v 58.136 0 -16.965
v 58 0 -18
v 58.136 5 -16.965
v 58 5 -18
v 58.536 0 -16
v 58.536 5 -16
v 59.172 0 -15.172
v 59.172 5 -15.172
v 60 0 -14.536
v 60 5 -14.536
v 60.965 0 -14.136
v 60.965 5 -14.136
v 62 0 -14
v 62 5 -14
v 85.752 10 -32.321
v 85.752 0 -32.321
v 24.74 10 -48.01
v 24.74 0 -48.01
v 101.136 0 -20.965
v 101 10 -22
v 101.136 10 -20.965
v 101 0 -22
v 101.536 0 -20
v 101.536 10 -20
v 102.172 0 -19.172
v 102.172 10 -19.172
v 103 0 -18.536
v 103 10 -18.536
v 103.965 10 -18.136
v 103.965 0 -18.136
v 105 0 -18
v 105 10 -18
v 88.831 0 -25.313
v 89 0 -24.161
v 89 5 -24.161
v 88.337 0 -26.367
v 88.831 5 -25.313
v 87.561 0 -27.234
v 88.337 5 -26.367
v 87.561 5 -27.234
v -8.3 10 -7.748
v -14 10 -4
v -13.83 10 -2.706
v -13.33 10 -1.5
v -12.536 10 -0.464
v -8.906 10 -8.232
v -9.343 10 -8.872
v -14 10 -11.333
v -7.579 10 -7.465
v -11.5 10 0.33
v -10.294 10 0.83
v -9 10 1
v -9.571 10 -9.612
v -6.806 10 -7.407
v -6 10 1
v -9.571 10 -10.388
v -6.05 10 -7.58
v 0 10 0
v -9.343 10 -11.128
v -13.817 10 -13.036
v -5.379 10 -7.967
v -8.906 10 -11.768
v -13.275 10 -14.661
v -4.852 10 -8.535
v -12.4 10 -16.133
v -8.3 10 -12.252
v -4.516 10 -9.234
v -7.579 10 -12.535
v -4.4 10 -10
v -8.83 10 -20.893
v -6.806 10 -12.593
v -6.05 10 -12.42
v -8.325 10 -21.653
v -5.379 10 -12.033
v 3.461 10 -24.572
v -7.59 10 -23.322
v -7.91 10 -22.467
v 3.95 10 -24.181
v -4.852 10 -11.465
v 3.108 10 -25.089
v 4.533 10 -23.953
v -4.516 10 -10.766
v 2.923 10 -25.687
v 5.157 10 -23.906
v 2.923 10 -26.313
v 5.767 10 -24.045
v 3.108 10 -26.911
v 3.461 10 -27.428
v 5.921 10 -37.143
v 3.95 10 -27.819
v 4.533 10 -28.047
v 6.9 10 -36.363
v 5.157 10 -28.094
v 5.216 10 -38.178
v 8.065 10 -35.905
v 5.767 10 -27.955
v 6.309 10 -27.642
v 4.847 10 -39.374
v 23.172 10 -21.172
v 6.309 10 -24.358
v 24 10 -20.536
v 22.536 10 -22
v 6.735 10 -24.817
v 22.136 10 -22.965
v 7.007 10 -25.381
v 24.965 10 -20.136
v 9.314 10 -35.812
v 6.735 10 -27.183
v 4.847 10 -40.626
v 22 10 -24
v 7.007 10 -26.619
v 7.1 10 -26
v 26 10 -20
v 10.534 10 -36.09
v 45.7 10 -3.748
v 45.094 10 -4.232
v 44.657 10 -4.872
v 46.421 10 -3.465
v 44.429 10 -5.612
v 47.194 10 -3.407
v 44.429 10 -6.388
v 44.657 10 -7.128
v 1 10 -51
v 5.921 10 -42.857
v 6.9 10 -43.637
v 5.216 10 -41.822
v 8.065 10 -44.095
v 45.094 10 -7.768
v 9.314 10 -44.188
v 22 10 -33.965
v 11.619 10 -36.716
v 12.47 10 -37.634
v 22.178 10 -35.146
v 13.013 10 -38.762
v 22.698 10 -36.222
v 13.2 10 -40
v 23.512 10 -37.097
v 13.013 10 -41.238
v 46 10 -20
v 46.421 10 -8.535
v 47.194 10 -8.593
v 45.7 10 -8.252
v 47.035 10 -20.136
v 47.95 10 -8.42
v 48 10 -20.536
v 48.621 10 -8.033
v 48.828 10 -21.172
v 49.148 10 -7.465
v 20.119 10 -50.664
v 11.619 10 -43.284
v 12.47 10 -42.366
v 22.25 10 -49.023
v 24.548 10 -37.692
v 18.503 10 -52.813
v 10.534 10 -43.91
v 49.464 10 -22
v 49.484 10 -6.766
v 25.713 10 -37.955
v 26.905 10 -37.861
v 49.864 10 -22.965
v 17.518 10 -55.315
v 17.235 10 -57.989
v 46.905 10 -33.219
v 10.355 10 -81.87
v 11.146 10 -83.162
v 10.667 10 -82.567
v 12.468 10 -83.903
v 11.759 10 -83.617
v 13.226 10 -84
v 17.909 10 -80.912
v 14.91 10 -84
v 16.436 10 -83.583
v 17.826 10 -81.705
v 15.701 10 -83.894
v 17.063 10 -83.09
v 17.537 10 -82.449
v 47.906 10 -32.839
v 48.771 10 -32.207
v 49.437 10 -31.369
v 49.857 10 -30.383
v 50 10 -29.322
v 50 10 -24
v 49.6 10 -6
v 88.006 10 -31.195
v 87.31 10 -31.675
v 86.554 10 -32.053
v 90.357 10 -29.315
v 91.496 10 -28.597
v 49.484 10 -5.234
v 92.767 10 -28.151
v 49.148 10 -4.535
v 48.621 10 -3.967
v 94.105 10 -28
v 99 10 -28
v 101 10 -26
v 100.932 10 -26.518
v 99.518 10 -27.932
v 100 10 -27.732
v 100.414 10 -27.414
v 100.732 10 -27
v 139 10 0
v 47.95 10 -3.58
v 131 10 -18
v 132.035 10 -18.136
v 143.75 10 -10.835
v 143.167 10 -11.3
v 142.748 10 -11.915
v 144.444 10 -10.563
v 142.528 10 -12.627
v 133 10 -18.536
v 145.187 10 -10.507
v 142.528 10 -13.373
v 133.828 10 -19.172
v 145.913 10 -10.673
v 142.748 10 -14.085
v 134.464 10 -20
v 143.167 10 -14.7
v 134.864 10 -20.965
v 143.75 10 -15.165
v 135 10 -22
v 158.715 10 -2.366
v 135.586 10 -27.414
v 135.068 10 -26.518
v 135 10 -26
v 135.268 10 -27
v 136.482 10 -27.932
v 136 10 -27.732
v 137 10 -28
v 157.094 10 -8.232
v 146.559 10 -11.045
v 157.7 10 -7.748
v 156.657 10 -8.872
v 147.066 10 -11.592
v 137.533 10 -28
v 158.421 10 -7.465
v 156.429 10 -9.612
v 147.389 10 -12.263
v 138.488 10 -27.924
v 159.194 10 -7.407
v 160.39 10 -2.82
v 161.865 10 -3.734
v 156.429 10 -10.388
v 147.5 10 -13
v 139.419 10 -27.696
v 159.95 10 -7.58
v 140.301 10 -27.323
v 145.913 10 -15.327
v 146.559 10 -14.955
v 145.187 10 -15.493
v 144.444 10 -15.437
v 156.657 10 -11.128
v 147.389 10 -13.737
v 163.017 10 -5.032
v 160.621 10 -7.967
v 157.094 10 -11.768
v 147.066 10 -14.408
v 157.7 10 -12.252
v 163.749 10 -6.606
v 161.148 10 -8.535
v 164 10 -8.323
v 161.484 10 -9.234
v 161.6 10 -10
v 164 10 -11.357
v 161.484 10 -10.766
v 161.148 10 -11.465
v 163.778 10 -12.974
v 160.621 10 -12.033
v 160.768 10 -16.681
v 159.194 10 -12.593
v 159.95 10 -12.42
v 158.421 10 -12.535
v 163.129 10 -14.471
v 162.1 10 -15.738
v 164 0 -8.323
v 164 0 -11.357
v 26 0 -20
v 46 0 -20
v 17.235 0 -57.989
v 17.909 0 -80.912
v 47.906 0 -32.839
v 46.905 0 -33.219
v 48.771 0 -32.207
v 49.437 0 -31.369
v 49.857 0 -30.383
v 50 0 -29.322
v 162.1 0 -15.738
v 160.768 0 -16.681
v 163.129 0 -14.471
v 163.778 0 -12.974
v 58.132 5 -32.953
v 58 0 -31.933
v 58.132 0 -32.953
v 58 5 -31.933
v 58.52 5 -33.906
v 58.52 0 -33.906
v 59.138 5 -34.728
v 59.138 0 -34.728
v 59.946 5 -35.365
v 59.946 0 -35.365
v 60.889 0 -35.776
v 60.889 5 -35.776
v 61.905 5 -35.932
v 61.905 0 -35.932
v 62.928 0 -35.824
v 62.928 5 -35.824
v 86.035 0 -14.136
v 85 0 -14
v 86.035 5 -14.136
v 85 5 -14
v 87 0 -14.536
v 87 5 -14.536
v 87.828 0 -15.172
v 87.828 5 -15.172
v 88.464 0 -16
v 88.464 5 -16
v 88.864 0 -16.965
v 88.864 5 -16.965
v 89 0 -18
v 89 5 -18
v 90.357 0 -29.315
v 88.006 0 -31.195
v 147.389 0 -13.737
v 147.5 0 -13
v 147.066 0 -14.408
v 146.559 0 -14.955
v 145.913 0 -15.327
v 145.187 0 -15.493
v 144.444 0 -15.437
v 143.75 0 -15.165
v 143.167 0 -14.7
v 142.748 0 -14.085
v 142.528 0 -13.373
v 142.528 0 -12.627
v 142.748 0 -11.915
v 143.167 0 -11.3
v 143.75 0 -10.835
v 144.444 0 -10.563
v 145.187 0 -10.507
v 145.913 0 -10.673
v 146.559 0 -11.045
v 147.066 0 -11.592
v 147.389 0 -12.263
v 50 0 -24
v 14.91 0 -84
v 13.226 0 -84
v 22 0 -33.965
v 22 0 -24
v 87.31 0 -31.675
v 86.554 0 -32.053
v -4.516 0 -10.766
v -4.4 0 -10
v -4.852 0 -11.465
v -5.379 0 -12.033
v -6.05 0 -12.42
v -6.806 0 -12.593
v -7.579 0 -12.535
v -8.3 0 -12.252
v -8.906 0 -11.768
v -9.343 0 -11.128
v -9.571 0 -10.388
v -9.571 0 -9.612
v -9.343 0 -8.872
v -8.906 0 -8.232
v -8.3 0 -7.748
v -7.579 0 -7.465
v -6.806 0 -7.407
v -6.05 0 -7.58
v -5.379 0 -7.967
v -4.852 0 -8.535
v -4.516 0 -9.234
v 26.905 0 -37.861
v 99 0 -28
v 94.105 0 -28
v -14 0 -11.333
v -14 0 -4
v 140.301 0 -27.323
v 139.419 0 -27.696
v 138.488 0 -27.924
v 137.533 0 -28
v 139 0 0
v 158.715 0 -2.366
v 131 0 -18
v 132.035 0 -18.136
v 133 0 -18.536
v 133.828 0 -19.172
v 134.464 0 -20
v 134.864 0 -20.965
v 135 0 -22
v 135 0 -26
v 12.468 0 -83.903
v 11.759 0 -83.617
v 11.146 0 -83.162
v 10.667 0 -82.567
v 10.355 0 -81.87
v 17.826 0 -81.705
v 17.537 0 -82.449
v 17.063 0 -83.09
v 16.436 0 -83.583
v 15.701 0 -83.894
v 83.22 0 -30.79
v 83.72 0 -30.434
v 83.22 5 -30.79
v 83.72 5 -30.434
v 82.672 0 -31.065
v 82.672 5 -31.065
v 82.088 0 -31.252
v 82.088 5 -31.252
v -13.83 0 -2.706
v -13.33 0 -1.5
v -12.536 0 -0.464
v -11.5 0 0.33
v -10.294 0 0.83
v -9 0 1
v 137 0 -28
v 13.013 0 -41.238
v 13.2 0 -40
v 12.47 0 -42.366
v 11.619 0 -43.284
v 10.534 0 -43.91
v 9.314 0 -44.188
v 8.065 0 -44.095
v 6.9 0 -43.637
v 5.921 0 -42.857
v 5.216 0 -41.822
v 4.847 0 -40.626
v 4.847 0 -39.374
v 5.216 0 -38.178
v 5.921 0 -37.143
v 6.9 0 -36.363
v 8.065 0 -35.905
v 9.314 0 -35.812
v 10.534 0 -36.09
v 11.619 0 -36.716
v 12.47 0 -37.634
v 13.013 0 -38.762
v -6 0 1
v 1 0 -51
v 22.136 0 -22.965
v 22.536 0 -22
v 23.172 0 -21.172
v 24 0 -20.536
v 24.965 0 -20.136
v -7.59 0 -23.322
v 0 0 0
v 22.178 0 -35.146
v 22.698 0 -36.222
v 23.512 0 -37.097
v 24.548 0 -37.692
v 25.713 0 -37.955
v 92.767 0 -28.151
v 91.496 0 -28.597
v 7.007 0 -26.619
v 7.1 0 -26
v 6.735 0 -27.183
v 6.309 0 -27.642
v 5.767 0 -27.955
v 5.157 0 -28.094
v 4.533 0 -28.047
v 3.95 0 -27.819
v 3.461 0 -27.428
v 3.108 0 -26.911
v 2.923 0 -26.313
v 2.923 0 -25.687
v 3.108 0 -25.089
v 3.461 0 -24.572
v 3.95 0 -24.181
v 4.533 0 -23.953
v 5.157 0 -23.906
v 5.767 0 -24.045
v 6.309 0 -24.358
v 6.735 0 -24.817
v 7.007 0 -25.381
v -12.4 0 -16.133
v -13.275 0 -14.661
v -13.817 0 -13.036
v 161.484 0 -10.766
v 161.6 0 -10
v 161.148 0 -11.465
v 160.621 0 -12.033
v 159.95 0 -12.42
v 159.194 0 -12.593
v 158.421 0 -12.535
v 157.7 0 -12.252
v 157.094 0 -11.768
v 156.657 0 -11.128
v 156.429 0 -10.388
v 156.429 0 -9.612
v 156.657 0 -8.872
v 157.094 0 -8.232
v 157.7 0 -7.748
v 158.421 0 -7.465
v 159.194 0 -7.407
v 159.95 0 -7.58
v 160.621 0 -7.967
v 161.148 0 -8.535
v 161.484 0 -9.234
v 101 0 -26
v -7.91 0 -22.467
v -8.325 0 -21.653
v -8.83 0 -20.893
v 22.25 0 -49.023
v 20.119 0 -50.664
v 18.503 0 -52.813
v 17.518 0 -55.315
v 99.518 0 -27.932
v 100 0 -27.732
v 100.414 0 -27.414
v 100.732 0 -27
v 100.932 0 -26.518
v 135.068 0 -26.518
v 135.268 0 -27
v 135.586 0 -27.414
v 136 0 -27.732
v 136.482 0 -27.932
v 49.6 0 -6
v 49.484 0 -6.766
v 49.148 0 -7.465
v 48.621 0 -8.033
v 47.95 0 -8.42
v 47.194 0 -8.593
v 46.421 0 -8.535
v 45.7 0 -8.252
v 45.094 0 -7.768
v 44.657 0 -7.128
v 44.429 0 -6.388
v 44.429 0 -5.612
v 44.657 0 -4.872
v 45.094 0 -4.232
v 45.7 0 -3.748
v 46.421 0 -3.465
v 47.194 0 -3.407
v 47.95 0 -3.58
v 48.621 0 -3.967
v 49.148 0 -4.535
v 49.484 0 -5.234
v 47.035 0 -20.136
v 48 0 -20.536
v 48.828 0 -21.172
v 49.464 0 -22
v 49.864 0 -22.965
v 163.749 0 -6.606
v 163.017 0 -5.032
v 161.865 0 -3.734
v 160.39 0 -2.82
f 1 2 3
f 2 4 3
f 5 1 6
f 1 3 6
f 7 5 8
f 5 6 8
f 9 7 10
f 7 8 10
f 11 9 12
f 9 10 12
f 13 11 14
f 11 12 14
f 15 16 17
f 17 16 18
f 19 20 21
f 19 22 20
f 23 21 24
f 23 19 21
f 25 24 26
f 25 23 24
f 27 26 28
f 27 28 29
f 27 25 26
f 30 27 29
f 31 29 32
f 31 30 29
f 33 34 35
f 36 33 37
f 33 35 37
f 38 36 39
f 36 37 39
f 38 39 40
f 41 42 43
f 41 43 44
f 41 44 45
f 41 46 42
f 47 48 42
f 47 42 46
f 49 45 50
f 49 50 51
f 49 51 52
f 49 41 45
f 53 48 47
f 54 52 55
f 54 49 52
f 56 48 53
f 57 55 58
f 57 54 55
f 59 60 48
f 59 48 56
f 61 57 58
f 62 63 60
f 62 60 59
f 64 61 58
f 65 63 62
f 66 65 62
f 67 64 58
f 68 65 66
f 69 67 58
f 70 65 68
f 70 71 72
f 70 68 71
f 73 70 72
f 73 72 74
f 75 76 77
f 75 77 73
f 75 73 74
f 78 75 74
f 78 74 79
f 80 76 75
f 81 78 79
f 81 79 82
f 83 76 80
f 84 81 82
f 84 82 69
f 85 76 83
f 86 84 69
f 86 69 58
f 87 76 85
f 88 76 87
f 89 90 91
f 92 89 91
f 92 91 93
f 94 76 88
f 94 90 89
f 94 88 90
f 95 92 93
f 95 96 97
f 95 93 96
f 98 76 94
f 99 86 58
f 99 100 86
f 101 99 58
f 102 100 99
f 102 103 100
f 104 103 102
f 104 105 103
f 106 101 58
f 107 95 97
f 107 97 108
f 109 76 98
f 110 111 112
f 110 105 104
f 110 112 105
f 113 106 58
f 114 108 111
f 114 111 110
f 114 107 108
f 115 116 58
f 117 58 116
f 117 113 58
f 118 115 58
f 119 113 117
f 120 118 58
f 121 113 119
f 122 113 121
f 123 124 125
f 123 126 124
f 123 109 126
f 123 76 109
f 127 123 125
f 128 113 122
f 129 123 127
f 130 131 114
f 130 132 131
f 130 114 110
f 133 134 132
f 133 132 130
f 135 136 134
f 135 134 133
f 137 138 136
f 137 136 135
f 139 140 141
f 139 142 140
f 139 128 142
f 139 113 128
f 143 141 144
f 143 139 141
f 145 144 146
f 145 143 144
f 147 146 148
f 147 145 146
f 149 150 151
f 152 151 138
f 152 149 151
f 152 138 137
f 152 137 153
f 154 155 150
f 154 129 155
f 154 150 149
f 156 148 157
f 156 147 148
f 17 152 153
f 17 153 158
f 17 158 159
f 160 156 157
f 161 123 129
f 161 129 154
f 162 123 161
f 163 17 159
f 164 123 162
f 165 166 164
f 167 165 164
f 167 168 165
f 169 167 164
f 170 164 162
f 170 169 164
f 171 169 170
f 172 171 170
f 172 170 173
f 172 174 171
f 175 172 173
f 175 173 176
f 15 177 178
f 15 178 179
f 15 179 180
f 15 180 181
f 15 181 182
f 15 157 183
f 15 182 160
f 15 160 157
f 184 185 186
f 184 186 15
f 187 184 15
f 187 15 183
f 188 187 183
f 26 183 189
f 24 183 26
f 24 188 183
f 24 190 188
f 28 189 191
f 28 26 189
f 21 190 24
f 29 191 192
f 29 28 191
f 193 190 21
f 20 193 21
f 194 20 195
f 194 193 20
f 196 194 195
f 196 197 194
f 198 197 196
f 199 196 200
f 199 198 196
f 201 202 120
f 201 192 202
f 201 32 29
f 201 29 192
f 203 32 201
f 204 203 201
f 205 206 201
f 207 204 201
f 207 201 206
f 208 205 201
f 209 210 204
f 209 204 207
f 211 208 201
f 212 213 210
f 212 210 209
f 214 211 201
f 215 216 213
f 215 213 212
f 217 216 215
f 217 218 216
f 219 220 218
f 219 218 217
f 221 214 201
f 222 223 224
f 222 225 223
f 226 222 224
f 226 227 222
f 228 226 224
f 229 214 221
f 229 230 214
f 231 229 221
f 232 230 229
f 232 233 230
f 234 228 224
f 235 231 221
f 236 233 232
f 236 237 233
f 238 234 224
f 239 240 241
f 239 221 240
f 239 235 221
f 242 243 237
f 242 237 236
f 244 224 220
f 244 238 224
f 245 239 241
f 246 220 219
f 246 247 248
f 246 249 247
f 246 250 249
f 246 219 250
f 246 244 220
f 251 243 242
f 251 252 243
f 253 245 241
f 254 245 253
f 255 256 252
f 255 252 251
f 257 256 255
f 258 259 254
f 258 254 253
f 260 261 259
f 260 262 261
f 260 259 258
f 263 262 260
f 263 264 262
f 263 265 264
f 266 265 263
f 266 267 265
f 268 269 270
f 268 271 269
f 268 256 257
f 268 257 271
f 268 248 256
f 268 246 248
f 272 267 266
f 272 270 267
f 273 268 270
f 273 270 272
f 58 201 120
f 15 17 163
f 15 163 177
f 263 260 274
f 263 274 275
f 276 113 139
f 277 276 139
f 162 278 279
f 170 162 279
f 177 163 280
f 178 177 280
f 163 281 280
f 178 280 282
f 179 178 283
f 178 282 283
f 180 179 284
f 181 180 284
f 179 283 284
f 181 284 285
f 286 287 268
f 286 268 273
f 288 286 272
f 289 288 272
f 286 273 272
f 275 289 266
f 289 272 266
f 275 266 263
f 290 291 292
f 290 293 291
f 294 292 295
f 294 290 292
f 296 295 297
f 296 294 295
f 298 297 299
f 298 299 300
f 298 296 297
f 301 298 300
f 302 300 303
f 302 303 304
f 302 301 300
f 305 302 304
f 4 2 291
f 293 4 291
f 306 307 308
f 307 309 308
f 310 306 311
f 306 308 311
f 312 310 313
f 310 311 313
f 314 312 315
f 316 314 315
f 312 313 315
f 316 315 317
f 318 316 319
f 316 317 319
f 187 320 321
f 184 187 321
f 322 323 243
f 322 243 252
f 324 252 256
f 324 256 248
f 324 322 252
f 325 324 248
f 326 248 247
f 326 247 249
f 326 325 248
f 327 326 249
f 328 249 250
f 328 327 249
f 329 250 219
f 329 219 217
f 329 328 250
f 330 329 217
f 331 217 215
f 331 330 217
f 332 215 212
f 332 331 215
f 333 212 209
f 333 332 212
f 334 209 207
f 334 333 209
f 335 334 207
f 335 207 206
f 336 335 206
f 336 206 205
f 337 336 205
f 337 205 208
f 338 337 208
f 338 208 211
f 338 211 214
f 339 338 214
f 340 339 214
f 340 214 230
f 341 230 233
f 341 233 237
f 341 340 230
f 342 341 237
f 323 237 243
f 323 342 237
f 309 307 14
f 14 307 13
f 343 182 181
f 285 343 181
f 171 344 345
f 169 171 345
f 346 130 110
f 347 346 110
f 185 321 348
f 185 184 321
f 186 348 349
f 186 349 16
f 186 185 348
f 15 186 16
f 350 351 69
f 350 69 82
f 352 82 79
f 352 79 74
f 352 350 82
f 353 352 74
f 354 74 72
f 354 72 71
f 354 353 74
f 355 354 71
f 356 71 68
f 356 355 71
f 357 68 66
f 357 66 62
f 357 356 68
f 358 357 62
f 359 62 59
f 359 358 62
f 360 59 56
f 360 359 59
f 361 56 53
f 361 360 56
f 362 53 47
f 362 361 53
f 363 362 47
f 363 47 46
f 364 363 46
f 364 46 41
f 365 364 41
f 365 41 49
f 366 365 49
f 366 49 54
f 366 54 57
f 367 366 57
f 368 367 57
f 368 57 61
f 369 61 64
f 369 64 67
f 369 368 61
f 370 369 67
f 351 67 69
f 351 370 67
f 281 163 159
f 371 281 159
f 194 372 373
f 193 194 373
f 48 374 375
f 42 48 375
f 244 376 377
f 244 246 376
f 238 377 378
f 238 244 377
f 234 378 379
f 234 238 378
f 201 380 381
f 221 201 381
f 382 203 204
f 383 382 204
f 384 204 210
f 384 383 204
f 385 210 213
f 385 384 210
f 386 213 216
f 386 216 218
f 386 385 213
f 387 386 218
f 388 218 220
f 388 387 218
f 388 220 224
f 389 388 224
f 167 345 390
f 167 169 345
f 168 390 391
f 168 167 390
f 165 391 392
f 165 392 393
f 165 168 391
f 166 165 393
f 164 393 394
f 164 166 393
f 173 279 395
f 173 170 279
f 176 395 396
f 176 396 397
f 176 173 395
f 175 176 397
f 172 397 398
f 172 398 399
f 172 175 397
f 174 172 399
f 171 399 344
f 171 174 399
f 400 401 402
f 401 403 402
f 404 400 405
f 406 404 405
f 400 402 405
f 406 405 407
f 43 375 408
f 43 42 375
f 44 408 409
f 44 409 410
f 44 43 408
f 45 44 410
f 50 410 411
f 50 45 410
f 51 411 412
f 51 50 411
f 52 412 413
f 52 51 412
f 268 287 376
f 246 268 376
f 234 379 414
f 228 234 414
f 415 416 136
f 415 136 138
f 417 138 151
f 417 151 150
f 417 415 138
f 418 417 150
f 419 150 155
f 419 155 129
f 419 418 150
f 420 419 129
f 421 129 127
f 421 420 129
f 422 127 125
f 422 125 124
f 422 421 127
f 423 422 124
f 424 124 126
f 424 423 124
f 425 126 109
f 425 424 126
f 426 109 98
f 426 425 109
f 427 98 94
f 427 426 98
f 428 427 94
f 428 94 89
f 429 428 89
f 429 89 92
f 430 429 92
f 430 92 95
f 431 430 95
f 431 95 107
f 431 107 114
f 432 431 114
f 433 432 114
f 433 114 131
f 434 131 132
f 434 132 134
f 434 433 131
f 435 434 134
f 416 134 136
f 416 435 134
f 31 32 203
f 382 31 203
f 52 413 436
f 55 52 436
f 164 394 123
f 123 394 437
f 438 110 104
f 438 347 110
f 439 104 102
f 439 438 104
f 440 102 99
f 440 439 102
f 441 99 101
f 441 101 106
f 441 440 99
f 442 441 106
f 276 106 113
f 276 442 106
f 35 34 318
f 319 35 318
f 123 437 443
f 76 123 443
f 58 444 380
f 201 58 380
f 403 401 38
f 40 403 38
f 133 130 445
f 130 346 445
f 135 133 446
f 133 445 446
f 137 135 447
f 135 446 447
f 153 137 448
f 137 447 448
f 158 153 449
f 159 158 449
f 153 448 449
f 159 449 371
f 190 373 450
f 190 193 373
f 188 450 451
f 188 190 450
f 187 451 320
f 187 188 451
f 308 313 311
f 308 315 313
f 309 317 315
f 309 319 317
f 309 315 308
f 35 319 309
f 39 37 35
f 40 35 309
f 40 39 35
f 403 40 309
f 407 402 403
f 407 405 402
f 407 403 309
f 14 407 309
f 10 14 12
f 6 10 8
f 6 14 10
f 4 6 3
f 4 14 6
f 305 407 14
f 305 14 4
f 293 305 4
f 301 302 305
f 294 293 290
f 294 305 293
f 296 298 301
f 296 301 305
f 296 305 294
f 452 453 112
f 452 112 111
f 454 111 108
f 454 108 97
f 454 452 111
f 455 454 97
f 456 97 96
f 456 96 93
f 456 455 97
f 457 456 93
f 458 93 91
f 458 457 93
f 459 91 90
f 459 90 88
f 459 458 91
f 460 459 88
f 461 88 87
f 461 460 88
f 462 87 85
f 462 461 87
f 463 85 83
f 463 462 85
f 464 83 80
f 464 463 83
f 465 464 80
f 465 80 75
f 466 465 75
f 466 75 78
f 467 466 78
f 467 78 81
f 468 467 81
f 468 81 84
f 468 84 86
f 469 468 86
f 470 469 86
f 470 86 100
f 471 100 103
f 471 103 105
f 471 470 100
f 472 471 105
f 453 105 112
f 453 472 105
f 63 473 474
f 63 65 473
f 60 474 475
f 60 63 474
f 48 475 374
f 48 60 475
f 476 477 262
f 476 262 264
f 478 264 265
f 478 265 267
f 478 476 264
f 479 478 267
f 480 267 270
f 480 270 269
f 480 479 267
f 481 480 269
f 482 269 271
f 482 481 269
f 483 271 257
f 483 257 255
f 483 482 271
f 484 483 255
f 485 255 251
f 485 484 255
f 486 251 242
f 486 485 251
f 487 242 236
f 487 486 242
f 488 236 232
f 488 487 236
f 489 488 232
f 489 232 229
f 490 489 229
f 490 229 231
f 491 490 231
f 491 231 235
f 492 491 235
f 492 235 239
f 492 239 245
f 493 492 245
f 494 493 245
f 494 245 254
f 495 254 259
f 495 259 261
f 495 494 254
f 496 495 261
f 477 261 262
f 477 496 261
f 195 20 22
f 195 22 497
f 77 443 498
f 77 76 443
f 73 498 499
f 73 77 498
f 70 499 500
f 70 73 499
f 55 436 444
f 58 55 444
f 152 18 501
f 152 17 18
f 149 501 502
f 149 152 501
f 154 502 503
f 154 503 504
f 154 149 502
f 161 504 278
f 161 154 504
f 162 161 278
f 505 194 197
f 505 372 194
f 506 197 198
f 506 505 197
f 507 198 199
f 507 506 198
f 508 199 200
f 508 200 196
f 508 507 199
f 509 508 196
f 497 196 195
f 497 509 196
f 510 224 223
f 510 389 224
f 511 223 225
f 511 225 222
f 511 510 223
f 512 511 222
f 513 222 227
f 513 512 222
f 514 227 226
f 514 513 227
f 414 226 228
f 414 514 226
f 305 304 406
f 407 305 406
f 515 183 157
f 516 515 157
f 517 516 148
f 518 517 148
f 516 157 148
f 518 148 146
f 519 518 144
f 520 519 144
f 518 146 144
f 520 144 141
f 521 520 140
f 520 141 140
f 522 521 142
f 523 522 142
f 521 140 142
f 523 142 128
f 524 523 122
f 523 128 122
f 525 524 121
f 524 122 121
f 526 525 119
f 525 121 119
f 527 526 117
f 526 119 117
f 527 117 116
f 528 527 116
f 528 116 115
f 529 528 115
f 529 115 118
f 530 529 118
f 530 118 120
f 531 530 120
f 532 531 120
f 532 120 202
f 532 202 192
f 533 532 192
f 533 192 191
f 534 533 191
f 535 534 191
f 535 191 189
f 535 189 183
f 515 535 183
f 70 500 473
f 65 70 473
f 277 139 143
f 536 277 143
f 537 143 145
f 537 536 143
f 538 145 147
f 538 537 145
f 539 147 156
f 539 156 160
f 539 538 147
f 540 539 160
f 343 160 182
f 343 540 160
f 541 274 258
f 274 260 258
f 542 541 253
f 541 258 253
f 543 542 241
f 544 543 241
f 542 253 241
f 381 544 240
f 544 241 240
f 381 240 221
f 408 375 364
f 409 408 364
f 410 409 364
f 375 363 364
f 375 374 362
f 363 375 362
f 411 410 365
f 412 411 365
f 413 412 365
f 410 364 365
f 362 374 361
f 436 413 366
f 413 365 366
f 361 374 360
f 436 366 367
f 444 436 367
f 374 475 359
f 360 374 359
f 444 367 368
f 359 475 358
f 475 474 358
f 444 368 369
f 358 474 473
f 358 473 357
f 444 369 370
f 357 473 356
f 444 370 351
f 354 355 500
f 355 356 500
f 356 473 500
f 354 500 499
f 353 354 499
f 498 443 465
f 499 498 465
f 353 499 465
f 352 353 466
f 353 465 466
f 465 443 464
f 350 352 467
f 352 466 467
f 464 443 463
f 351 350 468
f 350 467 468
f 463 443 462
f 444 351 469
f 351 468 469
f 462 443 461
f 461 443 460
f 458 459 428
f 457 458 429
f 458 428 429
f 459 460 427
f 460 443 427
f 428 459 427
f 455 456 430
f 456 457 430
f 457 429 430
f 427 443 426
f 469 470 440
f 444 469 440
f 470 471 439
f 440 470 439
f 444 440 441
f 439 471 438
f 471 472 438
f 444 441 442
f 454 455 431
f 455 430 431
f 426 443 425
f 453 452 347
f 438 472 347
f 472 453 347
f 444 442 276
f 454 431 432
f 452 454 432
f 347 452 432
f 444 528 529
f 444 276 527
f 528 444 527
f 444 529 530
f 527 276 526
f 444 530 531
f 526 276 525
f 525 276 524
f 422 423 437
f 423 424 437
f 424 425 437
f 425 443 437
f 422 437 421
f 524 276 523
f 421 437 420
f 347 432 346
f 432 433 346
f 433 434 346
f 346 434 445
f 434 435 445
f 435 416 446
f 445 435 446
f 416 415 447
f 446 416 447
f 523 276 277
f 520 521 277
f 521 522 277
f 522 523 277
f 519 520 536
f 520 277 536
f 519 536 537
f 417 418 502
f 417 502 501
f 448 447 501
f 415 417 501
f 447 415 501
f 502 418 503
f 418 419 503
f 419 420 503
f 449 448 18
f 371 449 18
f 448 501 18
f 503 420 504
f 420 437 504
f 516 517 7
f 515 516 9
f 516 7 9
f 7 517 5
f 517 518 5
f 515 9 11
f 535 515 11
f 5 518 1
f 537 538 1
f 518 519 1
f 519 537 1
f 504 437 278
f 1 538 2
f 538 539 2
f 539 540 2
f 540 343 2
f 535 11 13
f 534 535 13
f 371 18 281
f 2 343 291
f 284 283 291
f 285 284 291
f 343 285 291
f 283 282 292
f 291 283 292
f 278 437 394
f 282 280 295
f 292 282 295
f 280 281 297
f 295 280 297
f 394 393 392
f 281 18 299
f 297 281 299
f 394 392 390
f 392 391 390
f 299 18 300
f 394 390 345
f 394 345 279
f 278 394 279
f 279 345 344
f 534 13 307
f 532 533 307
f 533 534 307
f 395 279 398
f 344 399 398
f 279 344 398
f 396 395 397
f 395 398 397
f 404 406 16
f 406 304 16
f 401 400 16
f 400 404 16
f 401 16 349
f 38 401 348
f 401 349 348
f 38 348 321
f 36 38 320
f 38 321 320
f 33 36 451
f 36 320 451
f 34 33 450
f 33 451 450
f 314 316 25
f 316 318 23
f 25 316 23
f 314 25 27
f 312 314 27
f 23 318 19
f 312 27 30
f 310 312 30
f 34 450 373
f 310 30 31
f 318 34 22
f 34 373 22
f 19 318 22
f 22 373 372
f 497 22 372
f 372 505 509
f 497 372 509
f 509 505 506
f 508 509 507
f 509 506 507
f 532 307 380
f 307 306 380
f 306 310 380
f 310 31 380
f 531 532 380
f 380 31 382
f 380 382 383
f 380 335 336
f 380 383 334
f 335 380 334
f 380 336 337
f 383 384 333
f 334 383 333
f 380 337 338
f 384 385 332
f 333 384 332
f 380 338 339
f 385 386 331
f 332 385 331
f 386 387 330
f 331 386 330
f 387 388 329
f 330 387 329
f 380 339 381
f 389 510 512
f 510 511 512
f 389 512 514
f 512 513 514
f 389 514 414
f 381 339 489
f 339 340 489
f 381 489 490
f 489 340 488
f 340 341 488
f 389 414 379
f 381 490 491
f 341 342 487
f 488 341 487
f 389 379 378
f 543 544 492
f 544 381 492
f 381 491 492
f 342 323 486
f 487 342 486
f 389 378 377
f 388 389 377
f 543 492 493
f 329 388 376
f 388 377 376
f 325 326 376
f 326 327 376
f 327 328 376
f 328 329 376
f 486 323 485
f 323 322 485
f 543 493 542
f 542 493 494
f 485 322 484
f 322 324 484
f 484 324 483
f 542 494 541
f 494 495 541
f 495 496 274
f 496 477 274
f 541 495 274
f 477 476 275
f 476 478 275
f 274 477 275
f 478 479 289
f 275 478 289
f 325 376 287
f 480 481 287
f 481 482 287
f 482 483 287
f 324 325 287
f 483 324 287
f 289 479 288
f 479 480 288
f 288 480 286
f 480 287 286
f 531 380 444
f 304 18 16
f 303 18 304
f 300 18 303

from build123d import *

# Parameters (mm, degrees)
SKETCH1_R           = 2.6
SKETCH1_R_2         = 2.1
SKETCH1_R_3         = 4.2
SKETCH1_R_4         = 2.5
BOSS_EXTRUDE1_DEPTH = 10
FILLET2_R           = 6
FILLET3_R           = 3
CUT_EXTRUDE1_DEPTH  = 11
SKETCH7_R           = 2.6
CUT_EXTRUDE4_DEPTH  = 11
FILLET8_R           = 5
FILLET9_R           = 4
SKETCH10_W          = 34
SKETCH10_H          = 10
CUT_EXTRUDE6_DEPTH  = 11
FILLET10_R          = 4
CUT_EXTRUDE7_DEPTH  = 5
FILLET14_R          = 6
FILLET15_R          = 2
FILLET16_R          = 10
FILLET17_R          = 8
FILLET18_R          = 4


with BuildPart() as part:
    # Sketch1 → Boss-Extrude1 (new body)
    with BuildSketch(Plane(origin=(0, 0, 0), x_dir=(1, 0, 0), z_dir=(0, 1, 0))):
        Polygon((164, 15), (139, 28), (92, 28), (87, 32), (17, 50), (18, 84), (11, 84), (1, 51), (-8, 22), (-14, 14), (-14, 2), (-14, -1), (-6, -1), (0, 0), (139, 0), (164, 3), align=None)
        with Locations((-7, 10)):
            Circle(SKETCH1_R, mode=Mode.SUBTRACT)
        with Locations((159, 10)):
            Circle(SKETCH1_R, mode=Mode.SUBTRACT)
        with Locations((5, 26)):
            Circle(SKETCH1_R_2, mode=Mode.SUBTRACT)
        with Locations((9, 40)):
            Circle(SKETCH1_R_3, mode=Mode.SUBTRACT)
        with Locations((145, 13)):
            Circle(SKETCH1_R_4, mode=Mode.SUBTRACT)
    extrude(amount=BOSS_EXTRUDE1_DEPTH)

    # Fillet2
    fillet2_edges = [part.edges().sort_by_distance(p)[0] for p in [
        (139, 5, -28),
        (164, 5, -15),
        (164, 5, -3),
    ]]
    fillet(fillet2_edges, radius=FILLET2_R)

    # Fillet3
    fillet3_edges = [part.edges().sort_by_distance(p)[0] for p in [
        (11, 5, -84),
        (18, 5, -84),
    ]]
    fillet(fillet3_edges, radius=FILLET3_R)

    # Sketch4 → Cut-Extrude1 (cut, through all)
    with BuildSketch(Plane(origin=(0, 10, 0), x_dir=(1, 0, 0), z_dir=(0, 1, 0))):
        Polygon((22, 39), (22, 20), (50, 20), (50, 32.5), align=None)
    extrude(amount=-CUT_EXTRUDE1_DEPTH, mode=Mode.SUBTRACT)

    # Sketch7 → Cut-Extrude4 (cut, through all)
    with BuildSketch(Plane(origin=(0, 10, 0), x_dir=(1, 0, 0), z_dir=(0, 1, 0))):
        with Locations((47, 6)):
            Circle(SKETCH7_R)
    extrude(amount=-CUT_EXTRUDE4_DEPTH, mode=Mode.SUBTRACT)

    # Fillet8
    fillet8_edges = [part.edges().sort_by_distance(p)[0] for p in [
        (-14, 5, 1),
    ]]
    fillet(fillet8_edges, radius=FILLET8_R)

    # Fillet9
    fillet9_edges = [part.edges().sort_by_distance(p)[0] for p in [
        (22, 5, -39),
        (50, 5, -32.5),
        (50, 5, -20),
        (22, 5, -20),
    ]]
    fillet(fillet9_edges, radius=FILLET9_R)

    # Sketch10 → Cut-Extrude6 (cut, through all)
    with BuildSketch(Plane(origin=(0, 10, 0), x_dir=(1, 0, 0), z_dir=(0, 1, 0))):
        with Locations((118, 23)):
            Rectangle(SKETCH10_W, SKETCH10_H)
    extrude(amount=-CUT_EXTRUDE6_DEPTH, mode=Mode.SUBTRACT)

    # Fillet10
    fillet10_edges = [part.edges().sort_by_distance(p)[0] for p in [
        (135, 5, -18),
        (101, 5, -18),
    ]]
    fillet(fillet10_edges, radius=FILLET10_R)

    # Sketch12 → Cut-Extrude7 (cut)
    with BuildSketch(Plane(origin=(0, 0, 0), x_dir=(1, 0, 0), z_dir=(0, 1, 0))):
        Polygon((58, 37), (83, 31.034746853), (89, 26.034746853), (89, 14), (58, 14), align=None)
    extrude(amount=CUT_EXTRUDE7_DEPTH, mode=Mode.SUBTRACT)

    # Fillet14
    fillet14_edges = [part.edges().sort_by_distance(p)[0] for p in [
        (87, 5, -32),
        (92, 5, -28),
    ]]
    fillet(fillet14_edges, radius=FILLET14_R)

    # Fillet15
    fillet15_edges = [part.edges().sort_by_distance(p)[0] for p in [
        (101, 5, -28),
        (135, 5, -28),
    ]]
    fillet(fillet15_edges, radius=FILLET15_R)

    # Fillet16
    fillet16_edges = [part.edges().sort_by_distance(p)[0] for p in [
        (17, 5, -50),
    ]]
    fillet(fillet16_edges, radius=FILLET16_R)

    # Fillet17
    fillet17_edges = [part.edges().sort_by_distance(p)[0] for p in [
        (-14, 5, -14),
        (-8, 5, -22),
    ]]
    fillet(fillet17_edges, radius=FILLET17_R)

    # Fillet18
    fillet18_edges = [part.edges().sort_by_distance(p)[0] for p in [
        (58, 2.5, -37),
        (58, 2.5, -14),
        (89, 2.5, -14),
        (89, 2.5, -26.034746853),
        (83, 2.5, -31.034746853),
    ]]
    fillet(fillet18_edges, radius=FILLET18_R)


solid = part.part
